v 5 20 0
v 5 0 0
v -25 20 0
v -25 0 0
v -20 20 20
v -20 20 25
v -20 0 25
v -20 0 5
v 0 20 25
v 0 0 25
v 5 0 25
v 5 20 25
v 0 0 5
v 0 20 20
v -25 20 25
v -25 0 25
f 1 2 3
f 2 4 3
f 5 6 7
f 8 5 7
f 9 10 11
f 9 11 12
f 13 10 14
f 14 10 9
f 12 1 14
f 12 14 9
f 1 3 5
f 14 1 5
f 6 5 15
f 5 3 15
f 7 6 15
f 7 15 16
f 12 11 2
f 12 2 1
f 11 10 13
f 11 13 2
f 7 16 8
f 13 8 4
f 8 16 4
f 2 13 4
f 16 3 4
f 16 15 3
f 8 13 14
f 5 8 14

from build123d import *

# Parameters (mm, degrees)
F0_W     = 20
F0_H     = 20
F1_DEPTH = 20
F3_W     = 20
F3_H     = 20
F3_H_2   = 5
F4_DEPTH = 5
F5_DEPTH = 20
F2_W     = 20
F2_H     = 5
F6_DEPTH = 5


with BuildPart() as f1:
    # F0 (on Right) → F1 (new body)
    with BuildSketch(Plane.YZ):
        with Locations((10, 10)):
            Rectangle(F0_W, F0_H)
    extrude(amount=-F1_DEPTH)

    # F3 (on face) → F4 (join)
    with BuildSketch(Plane(origin=(-20, 0, 0), x_dir=(0, -1, 0), z_dir=(-1, 0, 0))):
        with Locations((-10, 10)):
            Rectangle(F3_W, F3_H)
        with Locations((-10, 22.5)):
            Rectangle(F3_W, F3_H_2)
    extrude(amount=F4_DEPTH)

    # F2 (on face) → F5 (cut)
    with BuildSketch(Plane.YZ):
        Polygon((0, 5), (20, 20), (0, 20), align=None)
    extrude(amount=-F5_DEPTH, mode=Mode.SUBTRACT)

    # F2 (on face) → F6 (join)
    with BuildSketch(Plane.YZ):
        with Locations((10, 22.5)):
            Rectangle(F2_W, F2_H)
        Polygon((0, 5), (20, 20), (0, 20), align=None)
        Polygon((0, 0), (20, 0), (20, 20), (0, 5), align=None)
    extrude(amount=F6_DEPTH)


solid = f1.part
